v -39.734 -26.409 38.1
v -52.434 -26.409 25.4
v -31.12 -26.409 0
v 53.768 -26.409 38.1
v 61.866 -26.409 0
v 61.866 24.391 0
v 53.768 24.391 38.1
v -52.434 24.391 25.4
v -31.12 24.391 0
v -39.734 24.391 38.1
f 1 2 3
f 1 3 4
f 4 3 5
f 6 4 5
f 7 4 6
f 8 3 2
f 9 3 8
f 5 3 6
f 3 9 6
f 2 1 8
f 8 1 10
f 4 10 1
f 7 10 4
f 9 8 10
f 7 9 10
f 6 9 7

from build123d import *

# Parameters (mm, degrees)
F0_W     = 114.3
F0_H     = 50.8
F1_DEPTH = 38.1
F2_SIZE2 = 21.3131306319
F2_SIZE  = 25.4
F3_SIZE  = 12.69999
F4_SIZE2 = 8.098395
F4_SIZE  = 38.09999


# Not quite as in the source:
# - a fillet or chamfer is up to 0.001 mm smaller than in the source, because OpenCascade refuses the exact size


with BuildPart() as f1:
    # F0 (on Top) → F1 (new body)
    with BuildSketch(Plane.XY):
        with Locations((4.716448799, -1.0087825358)):
            Rectangle(F0_W, F0_H)
    extrude(amount=F1_DEPTH)

    # F2
    f2_edges = [f1.edges().sort_by_distance(p)[0] for p in [
        (-52.433551, -1.008783, 0),
    ]]
    f2_side = f1.faces().sort_by_distance((-52.433551, -1.008783, 19.05))[0]
    chamfer(f2_edges, length=F2_SIZE, length2=F2_SIZE2, reference=f2_side)

    # F3 (size 12.7 in the source; OpenCascade refuses exactly that, so slightly less here)
    f3_edges = [f1.edges().sort_by_distance(p)[0] for p in [
        (-52.433551, -1.008783, 38.1),
    ]]
    chamfer(f3_edges, length=F3_SIZE)

    # F4 (size 38.1 and 8.0984049996 in the source; OpenCascade refuses exactly that, so slightly less here)
    f4_edges = [f1.edges().sort_by_distance(p)[0] for p in [
        (61.866449, -1.008783, 38.1),
    ]]
    f4_side = f1.faces().sort_by_distance((61.866449, -1.008783, 19.05))[0]
    chamfer(f4_edges, length=F4_SIZE, length2=F4_SIZE2, reference=f4_side)


solid = f1.part
